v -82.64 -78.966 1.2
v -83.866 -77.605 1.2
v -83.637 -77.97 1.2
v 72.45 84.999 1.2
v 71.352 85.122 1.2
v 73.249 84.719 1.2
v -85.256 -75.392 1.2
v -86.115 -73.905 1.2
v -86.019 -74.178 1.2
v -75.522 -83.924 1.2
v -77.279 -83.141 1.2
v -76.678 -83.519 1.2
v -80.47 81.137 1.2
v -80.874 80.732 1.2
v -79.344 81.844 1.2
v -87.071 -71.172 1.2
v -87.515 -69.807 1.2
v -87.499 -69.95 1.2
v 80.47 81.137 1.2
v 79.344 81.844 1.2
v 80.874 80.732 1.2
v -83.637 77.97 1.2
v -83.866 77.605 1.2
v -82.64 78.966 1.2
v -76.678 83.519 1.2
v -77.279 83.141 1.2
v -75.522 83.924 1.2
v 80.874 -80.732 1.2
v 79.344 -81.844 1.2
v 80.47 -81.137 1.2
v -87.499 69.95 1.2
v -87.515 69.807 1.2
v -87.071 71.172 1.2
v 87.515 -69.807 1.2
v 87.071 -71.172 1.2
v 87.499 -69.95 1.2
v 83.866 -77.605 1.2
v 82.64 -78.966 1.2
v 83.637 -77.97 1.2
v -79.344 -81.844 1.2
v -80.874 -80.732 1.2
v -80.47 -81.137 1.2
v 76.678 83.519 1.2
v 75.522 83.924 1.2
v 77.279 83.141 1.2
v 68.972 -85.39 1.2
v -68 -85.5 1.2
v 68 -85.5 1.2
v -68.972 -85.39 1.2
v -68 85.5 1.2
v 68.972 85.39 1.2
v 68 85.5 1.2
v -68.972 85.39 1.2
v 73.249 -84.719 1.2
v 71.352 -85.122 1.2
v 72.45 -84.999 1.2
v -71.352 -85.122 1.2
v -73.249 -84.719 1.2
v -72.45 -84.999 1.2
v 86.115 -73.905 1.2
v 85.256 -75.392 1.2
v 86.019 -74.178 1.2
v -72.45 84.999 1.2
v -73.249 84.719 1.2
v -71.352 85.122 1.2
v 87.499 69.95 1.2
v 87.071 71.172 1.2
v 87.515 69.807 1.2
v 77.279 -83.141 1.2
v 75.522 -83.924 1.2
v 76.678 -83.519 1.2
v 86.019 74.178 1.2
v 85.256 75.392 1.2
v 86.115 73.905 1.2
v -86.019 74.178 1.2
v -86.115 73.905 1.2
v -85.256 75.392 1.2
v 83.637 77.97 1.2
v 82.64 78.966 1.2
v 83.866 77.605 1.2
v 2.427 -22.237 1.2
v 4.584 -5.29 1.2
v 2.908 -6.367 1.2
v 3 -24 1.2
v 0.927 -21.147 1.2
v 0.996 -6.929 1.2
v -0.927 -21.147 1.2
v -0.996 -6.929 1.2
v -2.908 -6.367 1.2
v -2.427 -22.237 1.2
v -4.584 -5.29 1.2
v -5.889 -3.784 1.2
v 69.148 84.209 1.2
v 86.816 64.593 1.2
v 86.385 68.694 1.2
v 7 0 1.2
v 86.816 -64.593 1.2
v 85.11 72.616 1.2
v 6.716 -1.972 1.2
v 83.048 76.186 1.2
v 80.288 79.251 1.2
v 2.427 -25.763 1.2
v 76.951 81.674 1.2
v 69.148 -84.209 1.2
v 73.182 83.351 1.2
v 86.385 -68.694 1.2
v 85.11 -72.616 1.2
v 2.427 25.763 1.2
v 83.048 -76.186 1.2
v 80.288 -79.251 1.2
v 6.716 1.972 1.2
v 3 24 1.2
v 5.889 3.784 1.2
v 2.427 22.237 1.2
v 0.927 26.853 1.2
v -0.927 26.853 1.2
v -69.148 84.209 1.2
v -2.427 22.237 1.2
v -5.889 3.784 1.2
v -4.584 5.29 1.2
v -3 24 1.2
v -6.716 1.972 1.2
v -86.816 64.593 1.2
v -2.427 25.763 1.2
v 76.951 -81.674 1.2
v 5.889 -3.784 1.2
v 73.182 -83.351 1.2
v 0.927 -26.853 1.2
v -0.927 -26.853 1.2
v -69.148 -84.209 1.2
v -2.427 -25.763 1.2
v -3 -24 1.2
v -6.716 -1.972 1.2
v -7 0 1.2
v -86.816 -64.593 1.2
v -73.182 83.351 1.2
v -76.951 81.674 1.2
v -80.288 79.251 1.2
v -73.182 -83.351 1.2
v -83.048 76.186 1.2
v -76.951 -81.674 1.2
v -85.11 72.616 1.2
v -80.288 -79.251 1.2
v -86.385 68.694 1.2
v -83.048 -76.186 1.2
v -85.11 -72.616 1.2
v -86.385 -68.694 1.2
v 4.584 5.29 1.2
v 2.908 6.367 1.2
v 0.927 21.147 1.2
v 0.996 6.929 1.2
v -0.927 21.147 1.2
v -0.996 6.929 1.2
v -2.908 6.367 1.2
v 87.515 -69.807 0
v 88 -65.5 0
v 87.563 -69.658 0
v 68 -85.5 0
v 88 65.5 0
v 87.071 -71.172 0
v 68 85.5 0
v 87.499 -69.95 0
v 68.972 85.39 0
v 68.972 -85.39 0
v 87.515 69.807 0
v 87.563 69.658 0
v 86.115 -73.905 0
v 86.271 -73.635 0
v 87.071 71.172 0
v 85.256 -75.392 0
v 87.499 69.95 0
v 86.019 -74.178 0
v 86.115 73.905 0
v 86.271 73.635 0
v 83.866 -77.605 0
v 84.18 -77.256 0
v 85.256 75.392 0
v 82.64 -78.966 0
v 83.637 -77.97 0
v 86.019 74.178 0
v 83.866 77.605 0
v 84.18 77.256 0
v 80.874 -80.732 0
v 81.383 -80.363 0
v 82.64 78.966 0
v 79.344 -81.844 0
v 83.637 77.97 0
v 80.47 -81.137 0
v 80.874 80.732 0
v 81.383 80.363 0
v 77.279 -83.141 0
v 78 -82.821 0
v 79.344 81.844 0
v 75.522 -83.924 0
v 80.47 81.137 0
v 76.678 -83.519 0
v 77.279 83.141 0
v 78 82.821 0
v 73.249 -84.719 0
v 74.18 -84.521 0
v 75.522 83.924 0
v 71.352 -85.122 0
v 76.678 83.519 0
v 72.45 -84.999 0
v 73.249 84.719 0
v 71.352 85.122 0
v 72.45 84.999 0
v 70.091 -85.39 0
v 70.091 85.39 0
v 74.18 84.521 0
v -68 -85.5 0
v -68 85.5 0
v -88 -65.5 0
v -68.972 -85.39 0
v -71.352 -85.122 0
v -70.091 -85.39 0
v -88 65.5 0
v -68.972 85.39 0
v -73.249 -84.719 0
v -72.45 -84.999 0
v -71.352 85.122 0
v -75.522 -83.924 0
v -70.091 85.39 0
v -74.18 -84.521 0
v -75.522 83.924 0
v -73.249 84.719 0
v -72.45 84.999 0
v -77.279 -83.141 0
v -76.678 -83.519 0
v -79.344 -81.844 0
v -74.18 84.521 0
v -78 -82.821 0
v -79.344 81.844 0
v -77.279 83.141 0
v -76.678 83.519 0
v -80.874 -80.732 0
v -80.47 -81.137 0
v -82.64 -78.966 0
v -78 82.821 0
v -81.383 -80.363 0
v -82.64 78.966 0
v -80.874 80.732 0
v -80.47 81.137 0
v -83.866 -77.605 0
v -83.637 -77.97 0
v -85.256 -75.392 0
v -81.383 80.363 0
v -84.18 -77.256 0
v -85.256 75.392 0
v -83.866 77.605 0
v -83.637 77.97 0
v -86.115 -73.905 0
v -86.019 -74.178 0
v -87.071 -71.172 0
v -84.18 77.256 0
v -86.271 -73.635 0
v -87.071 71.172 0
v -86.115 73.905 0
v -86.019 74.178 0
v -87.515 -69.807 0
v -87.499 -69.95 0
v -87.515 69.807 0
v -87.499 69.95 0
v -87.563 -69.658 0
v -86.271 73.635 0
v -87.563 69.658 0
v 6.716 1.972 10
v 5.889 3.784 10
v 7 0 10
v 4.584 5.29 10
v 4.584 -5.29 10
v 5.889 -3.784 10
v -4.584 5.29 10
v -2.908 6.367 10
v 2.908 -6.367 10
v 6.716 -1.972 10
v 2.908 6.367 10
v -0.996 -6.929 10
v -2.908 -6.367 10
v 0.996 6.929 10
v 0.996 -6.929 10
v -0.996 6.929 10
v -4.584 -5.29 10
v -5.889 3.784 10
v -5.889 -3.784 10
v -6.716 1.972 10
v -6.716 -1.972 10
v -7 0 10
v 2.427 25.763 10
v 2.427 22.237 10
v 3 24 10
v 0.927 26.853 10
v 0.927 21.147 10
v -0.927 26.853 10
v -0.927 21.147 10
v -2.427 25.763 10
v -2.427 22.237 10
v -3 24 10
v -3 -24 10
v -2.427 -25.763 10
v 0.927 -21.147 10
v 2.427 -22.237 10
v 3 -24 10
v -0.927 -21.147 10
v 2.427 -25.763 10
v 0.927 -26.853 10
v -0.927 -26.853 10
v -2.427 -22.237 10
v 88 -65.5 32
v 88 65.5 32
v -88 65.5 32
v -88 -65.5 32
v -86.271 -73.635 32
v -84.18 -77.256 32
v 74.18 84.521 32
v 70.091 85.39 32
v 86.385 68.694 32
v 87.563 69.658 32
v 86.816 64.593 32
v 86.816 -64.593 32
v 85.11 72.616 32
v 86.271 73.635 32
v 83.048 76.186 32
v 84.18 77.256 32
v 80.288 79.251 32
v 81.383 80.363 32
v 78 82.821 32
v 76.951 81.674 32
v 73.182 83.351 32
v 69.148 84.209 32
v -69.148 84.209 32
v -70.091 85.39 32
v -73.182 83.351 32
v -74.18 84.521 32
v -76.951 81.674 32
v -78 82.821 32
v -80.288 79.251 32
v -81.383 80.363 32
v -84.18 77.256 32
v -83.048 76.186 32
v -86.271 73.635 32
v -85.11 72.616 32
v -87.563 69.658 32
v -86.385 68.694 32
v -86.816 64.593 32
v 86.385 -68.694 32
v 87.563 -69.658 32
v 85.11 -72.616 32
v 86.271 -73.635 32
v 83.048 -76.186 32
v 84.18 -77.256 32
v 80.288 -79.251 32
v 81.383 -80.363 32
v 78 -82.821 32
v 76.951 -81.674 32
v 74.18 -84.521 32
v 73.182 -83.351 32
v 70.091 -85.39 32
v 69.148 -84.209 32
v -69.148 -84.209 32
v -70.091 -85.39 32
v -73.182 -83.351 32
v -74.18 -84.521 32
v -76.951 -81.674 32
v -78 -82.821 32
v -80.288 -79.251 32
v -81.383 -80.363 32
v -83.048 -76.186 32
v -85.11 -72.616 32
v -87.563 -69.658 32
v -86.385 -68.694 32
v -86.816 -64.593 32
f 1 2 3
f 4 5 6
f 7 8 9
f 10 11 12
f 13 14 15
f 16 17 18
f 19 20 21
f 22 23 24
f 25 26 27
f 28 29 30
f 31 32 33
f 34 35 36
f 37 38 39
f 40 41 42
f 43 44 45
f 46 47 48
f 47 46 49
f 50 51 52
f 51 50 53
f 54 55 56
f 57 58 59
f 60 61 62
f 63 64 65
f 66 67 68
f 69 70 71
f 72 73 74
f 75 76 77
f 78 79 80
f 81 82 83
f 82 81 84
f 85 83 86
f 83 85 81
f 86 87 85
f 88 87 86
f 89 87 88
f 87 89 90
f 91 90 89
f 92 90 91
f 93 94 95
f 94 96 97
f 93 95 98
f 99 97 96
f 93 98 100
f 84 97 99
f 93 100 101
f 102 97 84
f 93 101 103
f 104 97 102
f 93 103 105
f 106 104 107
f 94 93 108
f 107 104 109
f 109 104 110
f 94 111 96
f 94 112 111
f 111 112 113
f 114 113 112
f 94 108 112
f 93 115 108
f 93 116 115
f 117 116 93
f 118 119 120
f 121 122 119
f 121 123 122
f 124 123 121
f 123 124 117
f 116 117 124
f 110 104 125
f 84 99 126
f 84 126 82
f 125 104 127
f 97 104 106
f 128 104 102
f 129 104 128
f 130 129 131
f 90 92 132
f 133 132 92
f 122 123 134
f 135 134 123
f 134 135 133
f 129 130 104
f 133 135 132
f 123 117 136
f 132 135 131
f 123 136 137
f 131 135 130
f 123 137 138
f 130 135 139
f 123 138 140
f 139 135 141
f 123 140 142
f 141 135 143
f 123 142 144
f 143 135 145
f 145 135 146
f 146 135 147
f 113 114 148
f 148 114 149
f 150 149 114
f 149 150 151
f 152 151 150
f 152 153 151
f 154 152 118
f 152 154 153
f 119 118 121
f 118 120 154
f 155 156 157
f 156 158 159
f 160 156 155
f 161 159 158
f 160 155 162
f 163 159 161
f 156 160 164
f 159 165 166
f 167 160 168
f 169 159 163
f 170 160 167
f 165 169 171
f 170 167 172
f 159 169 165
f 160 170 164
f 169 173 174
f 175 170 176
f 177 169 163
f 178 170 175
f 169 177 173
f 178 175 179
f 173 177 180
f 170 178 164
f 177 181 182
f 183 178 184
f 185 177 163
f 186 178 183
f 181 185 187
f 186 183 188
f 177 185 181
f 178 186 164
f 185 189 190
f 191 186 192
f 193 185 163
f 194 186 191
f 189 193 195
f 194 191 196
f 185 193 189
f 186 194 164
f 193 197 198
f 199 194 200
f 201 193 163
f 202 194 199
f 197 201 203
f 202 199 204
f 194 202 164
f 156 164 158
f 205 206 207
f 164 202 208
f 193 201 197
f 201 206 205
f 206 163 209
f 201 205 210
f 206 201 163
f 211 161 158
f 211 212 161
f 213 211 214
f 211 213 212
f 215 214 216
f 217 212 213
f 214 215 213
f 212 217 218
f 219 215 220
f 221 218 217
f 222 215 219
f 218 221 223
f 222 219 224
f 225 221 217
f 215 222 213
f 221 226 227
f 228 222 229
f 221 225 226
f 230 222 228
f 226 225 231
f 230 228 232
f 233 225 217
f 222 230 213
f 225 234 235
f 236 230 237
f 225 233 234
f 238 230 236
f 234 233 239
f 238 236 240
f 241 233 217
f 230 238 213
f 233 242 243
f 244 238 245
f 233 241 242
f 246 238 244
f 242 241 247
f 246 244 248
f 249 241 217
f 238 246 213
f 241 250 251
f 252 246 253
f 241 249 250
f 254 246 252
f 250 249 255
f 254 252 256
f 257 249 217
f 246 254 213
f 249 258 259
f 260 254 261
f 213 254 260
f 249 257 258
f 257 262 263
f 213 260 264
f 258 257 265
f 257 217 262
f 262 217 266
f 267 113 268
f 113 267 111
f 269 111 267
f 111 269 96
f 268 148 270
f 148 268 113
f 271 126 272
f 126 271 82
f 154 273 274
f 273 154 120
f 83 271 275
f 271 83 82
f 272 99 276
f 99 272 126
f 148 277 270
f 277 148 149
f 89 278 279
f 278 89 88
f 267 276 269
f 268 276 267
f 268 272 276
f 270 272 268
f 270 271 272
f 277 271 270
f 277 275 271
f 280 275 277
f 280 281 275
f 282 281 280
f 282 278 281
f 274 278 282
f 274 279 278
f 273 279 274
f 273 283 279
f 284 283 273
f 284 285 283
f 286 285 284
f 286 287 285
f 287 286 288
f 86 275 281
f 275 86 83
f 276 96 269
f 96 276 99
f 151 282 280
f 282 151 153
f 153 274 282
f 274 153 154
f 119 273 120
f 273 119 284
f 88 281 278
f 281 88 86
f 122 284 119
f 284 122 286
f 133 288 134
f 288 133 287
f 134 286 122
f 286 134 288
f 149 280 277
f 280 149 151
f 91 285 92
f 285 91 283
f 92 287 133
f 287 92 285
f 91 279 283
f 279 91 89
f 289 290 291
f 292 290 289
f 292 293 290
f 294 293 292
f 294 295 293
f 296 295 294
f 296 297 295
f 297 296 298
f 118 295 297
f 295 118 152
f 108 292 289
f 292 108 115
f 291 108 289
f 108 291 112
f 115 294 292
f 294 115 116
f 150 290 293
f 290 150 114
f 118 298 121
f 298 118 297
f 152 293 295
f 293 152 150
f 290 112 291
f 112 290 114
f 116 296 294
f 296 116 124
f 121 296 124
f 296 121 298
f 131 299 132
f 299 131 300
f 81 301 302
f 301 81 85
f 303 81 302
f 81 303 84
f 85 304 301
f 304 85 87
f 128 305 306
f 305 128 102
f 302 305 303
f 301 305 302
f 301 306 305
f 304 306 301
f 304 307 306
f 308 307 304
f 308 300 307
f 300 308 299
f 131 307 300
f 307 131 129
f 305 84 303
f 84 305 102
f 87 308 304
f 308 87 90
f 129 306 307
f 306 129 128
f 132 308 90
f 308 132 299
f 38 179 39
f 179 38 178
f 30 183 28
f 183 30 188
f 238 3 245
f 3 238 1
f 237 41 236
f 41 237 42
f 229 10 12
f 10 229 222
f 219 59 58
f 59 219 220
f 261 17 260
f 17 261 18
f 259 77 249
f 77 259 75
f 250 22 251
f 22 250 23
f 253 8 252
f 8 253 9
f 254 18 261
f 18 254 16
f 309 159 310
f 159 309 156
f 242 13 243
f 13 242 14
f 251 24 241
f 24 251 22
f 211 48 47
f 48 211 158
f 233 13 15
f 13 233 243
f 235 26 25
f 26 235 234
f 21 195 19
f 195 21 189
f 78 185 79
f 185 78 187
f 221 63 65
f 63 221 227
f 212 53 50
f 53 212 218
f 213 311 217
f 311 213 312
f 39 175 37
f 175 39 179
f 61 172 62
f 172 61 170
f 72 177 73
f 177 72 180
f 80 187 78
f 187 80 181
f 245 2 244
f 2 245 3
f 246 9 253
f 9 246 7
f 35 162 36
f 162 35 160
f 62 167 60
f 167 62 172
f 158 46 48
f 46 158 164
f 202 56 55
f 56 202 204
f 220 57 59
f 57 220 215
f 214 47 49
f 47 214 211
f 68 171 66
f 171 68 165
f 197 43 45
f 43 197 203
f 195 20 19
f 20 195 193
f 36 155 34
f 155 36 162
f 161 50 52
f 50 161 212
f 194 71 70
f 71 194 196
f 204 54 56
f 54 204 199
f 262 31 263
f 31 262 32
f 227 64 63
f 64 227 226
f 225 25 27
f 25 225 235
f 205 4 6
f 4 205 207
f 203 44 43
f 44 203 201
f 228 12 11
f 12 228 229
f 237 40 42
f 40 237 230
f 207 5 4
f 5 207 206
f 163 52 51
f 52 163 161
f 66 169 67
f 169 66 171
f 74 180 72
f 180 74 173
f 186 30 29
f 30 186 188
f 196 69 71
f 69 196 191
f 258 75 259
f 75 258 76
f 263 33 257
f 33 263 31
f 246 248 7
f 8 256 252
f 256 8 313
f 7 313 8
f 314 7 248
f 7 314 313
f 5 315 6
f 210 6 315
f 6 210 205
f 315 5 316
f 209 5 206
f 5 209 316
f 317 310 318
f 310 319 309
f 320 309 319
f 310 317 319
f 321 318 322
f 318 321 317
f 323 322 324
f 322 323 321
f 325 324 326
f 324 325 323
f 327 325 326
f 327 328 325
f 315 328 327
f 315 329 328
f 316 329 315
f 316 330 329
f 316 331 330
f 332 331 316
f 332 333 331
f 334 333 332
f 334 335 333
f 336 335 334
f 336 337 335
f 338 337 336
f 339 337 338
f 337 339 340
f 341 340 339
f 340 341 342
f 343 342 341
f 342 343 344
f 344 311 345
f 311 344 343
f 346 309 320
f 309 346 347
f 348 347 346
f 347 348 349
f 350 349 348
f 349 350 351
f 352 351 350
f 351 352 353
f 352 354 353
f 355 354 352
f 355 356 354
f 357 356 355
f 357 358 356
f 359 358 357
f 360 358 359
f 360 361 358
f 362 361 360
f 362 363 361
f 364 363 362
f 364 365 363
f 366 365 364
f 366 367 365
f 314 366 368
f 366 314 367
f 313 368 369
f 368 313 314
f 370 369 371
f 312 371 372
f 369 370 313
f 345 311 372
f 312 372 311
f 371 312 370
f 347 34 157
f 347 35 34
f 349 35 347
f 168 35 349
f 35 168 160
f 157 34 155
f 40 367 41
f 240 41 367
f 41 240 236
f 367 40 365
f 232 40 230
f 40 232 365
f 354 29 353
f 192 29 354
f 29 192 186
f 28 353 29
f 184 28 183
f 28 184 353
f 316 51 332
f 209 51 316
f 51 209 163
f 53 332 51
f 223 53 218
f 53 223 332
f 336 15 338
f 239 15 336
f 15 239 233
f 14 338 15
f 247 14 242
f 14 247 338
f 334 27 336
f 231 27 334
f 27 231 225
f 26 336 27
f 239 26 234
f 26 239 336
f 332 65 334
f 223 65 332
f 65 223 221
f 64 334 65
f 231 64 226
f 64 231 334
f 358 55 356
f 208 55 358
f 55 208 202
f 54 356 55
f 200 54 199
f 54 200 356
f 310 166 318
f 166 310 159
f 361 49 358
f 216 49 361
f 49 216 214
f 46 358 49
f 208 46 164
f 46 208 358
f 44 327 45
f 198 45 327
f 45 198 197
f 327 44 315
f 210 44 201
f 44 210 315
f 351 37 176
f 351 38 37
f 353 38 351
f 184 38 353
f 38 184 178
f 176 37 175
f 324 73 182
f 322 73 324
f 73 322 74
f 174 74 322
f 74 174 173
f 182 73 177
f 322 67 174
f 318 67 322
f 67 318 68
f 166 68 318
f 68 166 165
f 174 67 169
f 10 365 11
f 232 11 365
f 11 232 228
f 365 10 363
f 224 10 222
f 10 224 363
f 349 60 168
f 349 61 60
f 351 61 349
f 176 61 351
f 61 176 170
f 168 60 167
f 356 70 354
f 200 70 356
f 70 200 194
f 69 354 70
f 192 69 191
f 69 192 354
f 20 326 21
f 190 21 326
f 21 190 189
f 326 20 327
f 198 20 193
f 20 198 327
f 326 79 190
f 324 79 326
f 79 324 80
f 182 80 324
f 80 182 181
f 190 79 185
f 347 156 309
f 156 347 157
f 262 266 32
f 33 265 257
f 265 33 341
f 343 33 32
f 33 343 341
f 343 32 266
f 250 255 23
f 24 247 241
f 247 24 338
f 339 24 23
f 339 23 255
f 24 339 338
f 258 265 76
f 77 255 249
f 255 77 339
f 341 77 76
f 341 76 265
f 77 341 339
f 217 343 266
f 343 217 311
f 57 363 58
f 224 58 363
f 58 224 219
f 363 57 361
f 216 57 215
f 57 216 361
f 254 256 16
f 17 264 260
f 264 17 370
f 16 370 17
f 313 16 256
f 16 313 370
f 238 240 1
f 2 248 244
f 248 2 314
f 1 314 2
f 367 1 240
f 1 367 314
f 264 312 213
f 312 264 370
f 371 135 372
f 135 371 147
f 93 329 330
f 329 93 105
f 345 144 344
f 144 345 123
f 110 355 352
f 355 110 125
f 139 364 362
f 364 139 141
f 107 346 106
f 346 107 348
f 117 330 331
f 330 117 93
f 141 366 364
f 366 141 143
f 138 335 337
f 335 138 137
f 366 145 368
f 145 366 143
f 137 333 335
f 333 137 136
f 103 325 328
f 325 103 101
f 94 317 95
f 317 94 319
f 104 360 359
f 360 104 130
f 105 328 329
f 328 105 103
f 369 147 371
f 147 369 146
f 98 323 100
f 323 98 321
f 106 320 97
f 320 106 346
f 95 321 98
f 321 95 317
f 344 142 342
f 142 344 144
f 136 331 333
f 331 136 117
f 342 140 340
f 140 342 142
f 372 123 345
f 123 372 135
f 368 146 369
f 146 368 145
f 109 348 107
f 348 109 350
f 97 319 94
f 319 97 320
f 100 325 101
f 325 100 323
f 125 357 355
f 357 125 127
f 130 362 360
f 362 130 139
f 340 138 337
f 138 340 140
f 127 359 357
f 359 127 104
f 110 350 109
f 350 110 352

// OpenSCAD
core_w = 32;
height = 32;
props_r = 38;
space_x = 110 - 10;
space_y = 85 + 10;

corner_r = 20;
corner_a = 90;

thickness = 1.2;

total_width = props_r * 2 + space_x;
total_height = props_r * 2 + space_y;

echo("total_width: ", total_width);
echo("total_height: ", total_height);

module box() {
  translate([-space_x / 2, -space_y / 2, 0]) {
    hull() {
      translate([0, 0, 0]) {
        cylinder(h = height, r = props_r);
        translate([-props_r + corner_r, -props_r + corner_r, 0]) {
          cylinder(h = height, r = corner_r);
        }
      }
      translate([space_x, 0, 0]) {
        cylinder(h = height, r = props_r);
        translate([props_r - corner_r, -props_r + corner_r, 0]) {
          cylinder(h = height, r = corner_r);
        }
      }
      translate([0, space_y, 0]) {
        cylinder(h = height, r = props_r);
        translate([-props_r + corner_r, props_r - corner_r, 0]) {
          cylinder(h = height, r = corner_r);
        }
      }
      translate([space_x, space_y, 0]) {
        cylinder(h = height, r = props_r);
        translate([props_r - corner_r, props_r - corner_r, 0]) {
          cylinder(h = height, r = corner_r);
        }
      }
    }
  }
}

module open_box() {
  x_factor = (total_width * 100) / (total_width + thickness * 2) / 100;
  y_factor = (total_height * 100) / (total_height + thickness * 2) / 100;

  echo("x_factor: ", x_factor);
  echo("y_factor: ", y_factor);

  difference() {
    box();
    scale([x_factor, y_factor, 1]) {
      box();
    }
  }
}

module pieEdge(a, r, h, rot = 0) {
  difference() {
    pieSlice(a, r, h, rot);
    cylinder(h = h, r = r - 1);
  }
}

module pieSlice(a, r, h, rot = 0) {
  // a:angle, r:radius, h:height
  rotate(rot, [0, 0, 1]) {
    rotate_extrude(angle = a) {
      square([r, h]);
    }
  }
}

module core() {
  core_lock_r = 7;
  core_lock_h = 10;
  enforcer_shift = 20;
  core_lock2_r = 3;

  translate([-core_w / 2, -total_height / 2 + thickness, 0]) {
    cube([core_w, total_height - thickness - 55, thickness]);
  }

  module backtocenter() {
    translate([space_x / 2, space_y / 2, 0]) {
      cylinder(h = thickness, r = 5);
    }
  }
  cylinder(h = thickness, r = core_w / 2);
  cylinder(h = core_lock_h, r = core_lock_r);
  translate([0, 24, 0]) {
    cylinder(h = core_lock_h, r = core_lock2_r);
  }
  translate([0, -24, 0]) {
    cylinder(h = core_lock_h, r = core_lock2_r);
  }
  translate([-space_x / 2, -space_y / 2, 0]) {
    hull() {
      translate([0, -enforcer_shift, 0]) {
        backtocenter();
      }
      translate([space_x, 0, 0]) {
        translate([props_r - corner_r, -props_r + corner_r, 0]) {
          pieEdge(a = corner_a, rot = 270 + (90 - corner_a) / 2, h = thickness, r = corner_r);
        }
      }
      // }
      // hull() {
      translate([0, -enforcer_shift, 0]) {
        backtocenter();
      }
      translate([0, 0, 0]) {
        translate([-props_r + corner_r, -props_r + corner_r, 0]) {
          pieEdge(a = corner_a, rot = 180 + (90 - corner_a) / 2, h = thickness, r = corner_r);
        }
      }
      // }
      // hull() {
      translate([0, enforcer_shift, 0]) {
        backtocenter();
      }
      translate([0, space_y, 0]) {
        translate([-props_r + corner_r, props_r - corner_r, 0]) {
          pieEdge(a = corner_a, rot = 90 + (90 - corner_a) / 2, h = thickness, r = corner_r);
        }
      }
      // }
      // hull() {
      translate([0, enforcer_shift, 0]) {
        backtocenter();
      }
      translate([space_x, space_y, 0]) {
        translate([props_r - corner_r, props_r - corner_r, 0]) {
          pieEdge(a = corner_a, rot = 0 + (90 - corner_a) / 2, h = thickness, r = corner_r);
        }
      }
    }
  }
}

core();

render() {
  open_box();
}
